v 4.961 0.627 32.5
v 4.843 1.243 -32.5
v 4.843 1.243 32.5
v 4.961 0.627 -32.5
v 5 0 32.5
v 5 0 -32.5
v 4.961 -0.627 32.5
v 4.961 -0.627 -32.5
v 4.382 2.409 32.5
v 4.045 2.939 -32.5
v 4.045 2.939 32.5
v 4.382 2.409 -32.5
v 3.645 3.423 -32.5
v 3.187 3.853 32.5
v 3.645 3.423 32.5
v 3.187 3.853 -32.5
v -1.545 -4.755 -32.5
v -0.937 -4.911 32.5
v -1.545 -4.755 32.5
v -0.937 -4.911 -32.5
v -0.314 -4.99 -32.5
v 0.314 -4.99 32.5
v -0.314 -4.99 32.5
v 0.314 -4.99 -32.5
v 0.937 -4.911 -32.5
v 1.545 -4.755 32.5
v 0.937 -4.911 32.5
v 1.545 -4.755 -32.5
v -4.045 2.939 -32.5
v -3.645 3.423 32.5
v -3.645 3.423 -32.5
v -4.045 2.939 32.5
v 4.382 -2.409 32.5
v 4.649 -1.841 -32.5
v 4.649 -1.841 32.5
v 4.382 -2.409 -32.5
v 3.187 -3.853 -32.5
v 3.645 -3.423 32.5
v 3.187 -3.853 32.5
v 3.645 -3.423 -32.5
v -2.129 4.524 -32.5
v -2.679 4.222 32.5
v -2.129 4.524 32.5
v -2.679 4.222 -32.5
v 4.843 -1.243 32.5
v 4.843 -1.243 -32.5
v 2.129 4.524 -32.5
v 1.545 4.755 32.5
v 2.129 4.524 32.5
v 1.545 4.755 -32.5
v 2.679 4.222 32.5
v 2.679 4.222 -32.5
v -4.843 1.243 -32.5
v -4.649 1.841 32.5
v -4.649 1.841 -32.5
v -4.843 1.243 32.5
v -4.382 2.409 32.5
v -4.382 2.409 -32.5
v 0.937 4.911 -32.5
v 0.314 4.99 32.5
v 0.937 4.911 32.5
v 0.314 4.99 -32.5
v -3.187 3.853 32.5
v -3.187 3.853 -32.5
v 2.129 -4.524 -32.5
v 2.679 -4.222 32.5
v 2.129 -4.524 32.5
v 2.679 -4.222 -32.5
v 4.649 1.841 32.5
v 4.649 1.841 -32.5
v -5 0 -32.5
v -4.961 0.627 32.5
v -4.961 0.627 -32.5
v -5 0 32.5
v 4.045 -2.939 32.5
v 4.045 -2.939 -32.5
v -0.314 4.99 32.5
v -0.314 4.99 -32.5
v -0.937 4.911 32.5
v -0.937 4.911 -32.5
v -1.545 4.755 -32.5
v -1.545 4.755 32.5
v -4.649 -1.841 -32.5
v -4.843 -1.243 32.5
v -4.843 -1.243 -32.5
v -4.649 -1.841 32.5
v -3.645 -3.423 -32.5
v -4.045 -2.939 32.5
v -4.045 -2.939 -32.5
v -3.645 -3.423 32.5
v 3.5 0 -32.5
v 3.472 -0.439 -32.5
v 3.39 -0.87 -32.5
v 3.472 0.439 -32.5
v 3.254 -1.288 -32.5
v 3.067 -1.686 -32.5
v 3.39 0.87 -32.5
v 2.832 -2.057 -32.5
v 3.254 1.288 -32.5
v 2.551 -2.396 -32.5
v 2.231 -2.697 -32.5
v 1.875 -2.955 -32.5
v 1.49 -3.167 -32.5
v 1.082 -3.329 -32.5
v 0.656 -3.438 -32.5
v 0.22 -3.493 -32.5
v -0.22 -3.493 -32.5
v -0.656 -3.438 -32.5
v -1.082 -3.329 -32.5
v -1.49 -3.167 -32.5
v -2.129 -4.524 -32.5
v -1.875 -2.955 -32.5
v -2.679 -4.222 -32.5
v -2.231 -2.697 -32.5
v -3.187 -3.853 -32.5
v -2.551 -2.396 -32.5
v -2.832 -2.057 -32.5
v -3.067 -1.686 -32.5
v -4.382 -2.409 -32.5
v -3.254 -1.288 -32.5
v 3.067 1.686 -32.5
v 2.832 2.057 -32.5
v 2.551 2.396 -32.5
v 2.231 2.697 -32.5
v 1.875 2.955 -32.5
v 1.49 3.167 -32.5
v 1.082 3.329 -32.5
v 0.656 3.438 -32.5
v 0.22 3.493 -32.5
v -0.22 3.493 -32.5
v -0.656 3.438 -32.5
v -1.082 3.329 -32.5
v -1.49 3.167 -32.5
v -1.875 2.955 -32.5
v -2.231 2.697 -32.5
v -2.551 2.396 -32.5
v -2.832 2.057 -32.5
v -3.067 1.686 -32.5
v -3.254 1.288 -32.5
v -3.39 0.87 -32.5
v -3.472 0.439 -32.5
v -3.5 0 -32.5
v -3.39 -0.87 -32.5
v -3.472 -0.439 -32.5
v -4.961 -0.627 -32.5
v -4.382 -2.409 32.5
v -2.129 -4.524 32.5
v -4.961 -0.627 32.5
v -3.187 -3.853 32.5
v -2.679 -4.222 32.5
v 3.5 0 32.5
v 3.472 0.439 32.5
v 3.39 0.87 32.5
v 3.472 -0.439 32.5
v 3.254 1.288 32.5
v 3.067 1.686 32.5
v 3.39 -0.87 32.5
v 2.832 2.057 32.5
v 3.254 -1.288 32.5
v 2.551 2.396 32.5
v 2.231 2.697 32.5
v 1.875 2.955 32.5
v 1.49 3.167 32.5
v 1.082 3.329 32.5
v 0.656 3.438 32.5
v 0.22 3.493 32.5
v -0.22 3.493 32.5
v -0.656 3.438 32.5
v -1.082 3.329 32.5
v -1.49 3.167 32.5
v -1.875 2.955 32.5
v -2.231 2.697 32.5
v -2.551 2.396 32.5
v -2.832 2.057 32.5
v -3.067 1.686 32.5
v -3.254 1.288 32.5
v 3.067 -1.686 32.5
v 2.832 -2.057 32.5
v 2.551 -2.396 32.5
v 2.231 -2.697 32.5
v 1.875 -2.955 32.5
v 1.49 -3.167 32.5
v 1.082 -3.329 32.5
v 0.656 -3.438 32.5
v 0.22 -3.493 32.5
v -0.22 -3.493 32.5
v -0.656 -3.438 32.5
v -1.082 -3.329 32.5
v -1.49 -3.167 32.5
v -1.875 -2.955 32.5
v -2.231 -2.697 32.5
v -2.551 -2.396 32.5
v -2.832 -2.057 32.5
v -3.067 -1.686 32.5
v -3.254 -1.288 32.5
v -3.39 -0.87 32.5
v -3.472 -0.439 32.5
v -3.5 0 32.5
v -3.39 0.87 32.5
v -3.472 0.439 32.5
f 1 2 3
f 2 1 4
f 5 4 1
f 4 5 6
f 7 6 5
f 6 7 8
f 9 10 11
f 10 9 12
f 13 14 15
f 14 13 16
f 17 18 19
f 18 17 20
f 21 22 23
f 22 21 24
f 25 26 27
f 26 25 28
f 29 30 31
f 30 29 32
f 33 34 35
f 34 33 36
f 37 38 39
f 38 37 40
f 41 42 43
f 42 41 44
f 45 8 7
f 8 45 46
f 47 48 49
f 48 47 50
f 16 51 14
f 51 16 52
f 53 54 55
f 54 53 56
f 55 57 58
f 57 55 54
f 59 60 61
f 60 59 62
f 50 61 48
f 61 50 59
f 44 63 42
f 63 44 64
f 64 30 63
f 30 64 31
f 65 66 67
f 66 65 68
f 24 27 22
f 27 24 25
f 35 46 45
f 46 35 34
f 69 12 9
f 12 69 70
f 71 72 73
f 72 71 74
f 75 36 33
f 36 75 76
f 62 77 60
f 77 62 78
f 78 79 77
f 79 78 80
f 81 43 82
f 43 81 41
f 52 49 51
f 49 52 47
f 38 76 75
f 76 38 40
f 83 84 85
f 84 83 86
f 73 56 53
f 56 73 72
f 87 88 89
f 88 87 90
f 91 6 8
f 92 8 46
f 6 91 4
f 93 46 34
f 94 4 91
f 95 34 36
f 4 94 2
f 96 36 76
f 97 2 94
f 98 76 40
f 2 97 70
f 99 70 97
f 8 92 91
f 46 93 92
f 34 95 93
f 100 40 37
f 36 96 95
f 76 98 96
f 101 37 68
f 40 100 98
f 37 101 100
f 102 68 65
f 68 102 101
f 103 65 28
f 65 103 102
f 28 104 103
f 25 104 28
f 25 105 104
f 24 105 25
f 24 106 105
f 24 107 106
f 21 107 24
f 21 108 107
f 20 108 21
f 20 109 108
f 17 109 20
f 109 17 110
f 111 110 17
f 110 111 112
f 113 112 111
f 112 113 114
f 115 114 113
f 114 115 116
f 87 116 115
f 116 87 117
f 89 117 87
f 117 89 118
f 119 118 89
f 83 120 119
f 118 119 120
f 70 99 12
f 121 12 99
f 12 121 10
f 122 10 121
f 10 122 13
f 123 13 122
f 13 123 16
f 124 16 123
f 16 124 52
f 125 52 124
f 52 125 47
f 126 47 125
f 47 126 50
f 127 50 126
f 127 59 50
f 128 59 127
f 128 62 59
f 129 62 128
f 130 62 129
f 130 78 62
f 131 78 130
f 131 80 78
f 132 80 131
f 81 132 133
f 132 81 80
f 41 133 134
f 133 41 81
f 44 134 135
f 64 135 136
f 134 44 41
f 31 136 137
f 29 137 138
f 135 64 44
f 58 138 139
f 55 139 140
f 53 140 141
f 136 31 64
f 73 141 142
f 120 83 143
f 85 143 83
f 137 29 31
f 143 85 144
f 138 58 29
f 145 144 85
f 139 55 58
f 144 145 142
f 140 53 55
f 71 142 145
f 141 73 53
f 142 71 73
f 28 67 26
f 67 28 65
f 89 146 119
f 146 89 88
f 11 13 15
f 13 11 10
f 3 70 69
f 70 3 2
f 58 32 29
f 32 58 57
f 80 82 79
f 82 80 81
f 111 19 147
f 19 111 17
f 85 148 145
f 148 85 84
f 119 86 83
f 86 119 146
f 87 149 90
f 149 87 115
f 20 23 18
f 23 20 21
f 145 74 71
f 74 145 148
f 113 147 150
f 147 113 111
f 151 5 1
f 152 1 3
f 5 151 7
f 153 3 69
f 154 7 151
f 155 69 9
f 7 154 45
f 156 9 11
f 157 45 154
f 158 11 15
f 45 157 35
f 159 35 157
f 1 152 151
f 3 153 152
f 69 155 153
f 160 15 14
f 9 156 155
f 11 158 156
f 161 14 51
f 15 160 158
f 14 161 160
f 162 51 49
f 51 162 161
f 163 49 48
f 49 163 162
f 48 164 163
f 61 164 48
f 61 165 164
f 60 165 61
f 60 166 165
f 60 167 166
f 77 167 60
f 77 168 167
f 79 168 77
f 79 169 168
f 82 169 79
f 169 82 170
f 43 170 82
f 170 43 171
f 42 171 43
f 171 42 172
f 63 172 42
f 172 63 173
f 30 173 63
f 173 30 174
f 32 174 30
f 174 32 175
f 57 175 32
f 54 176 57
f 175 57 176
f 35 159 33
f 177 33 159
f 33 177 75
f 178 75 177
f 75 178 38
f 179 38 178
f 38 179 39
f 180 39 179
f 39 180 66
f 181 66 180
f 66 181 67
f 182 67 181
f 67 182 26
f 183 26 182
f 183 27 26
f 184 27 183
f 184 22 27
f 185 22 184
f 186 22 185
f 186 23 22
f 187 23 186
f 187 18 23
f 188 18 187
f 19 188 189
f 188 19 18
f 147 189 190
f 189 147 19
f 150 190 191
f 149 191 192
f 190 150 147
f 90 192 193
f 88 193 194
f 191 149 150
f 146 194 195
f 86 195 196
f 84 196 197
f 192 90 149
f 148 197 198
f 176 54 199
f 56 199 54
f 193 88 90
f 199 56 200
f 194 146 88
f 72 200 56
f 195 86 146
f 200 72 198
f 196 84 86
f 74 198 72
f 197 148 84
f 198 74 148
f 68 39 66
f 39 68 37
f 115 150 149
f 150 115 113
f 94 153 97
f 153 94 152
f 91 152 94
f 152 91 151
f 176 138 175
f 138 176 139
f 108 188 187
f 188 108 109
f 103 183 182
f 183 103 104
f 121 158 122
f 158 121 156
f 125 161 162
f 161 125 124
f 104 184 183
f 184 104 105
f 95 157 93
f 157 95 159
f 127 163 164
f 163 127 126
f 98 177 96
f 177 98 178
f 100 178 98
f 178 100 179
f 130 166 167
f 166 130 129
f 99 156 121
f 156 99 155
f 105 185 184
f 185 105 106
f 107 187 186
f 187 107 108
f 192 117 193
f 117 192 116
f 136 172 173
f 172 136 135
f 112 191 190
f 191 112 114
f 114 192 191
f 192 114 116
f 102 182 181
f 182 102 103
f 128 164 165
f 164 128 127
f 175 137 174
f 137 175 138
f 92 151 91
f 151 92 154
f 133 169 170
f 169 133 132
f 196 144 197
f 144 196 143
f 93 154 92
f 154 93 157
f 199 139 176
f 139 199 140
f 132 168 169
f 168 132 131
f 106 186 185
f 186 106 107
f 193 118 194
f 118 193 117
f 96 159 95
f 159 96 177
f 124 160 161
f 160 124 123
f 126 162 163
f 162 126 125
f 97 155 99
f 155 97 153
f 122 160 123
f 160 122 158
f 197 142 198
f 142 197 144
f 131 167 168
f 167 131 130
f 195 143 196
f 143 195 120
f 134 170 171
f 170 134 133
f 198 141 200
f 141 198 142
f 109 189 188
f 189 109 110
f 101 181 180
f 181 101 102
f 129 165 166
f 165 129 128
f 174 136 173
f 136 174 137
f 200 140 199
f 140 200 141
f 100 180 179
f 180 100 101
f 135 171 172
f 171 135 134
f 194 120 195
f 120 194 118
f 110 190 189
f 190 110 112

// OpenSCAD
$fn = 50;


difference() {
	union() {
		translate(v = [0, 0, -32.5000000000]) {
			cylinder(h = 65, r = 5.0000000000);
		}
	}
	union() {
		translate(v = [0, 0, -100.0000000000]) {
			cylinder(h = 200, r = 3.5000000000);
		}
	}
}
